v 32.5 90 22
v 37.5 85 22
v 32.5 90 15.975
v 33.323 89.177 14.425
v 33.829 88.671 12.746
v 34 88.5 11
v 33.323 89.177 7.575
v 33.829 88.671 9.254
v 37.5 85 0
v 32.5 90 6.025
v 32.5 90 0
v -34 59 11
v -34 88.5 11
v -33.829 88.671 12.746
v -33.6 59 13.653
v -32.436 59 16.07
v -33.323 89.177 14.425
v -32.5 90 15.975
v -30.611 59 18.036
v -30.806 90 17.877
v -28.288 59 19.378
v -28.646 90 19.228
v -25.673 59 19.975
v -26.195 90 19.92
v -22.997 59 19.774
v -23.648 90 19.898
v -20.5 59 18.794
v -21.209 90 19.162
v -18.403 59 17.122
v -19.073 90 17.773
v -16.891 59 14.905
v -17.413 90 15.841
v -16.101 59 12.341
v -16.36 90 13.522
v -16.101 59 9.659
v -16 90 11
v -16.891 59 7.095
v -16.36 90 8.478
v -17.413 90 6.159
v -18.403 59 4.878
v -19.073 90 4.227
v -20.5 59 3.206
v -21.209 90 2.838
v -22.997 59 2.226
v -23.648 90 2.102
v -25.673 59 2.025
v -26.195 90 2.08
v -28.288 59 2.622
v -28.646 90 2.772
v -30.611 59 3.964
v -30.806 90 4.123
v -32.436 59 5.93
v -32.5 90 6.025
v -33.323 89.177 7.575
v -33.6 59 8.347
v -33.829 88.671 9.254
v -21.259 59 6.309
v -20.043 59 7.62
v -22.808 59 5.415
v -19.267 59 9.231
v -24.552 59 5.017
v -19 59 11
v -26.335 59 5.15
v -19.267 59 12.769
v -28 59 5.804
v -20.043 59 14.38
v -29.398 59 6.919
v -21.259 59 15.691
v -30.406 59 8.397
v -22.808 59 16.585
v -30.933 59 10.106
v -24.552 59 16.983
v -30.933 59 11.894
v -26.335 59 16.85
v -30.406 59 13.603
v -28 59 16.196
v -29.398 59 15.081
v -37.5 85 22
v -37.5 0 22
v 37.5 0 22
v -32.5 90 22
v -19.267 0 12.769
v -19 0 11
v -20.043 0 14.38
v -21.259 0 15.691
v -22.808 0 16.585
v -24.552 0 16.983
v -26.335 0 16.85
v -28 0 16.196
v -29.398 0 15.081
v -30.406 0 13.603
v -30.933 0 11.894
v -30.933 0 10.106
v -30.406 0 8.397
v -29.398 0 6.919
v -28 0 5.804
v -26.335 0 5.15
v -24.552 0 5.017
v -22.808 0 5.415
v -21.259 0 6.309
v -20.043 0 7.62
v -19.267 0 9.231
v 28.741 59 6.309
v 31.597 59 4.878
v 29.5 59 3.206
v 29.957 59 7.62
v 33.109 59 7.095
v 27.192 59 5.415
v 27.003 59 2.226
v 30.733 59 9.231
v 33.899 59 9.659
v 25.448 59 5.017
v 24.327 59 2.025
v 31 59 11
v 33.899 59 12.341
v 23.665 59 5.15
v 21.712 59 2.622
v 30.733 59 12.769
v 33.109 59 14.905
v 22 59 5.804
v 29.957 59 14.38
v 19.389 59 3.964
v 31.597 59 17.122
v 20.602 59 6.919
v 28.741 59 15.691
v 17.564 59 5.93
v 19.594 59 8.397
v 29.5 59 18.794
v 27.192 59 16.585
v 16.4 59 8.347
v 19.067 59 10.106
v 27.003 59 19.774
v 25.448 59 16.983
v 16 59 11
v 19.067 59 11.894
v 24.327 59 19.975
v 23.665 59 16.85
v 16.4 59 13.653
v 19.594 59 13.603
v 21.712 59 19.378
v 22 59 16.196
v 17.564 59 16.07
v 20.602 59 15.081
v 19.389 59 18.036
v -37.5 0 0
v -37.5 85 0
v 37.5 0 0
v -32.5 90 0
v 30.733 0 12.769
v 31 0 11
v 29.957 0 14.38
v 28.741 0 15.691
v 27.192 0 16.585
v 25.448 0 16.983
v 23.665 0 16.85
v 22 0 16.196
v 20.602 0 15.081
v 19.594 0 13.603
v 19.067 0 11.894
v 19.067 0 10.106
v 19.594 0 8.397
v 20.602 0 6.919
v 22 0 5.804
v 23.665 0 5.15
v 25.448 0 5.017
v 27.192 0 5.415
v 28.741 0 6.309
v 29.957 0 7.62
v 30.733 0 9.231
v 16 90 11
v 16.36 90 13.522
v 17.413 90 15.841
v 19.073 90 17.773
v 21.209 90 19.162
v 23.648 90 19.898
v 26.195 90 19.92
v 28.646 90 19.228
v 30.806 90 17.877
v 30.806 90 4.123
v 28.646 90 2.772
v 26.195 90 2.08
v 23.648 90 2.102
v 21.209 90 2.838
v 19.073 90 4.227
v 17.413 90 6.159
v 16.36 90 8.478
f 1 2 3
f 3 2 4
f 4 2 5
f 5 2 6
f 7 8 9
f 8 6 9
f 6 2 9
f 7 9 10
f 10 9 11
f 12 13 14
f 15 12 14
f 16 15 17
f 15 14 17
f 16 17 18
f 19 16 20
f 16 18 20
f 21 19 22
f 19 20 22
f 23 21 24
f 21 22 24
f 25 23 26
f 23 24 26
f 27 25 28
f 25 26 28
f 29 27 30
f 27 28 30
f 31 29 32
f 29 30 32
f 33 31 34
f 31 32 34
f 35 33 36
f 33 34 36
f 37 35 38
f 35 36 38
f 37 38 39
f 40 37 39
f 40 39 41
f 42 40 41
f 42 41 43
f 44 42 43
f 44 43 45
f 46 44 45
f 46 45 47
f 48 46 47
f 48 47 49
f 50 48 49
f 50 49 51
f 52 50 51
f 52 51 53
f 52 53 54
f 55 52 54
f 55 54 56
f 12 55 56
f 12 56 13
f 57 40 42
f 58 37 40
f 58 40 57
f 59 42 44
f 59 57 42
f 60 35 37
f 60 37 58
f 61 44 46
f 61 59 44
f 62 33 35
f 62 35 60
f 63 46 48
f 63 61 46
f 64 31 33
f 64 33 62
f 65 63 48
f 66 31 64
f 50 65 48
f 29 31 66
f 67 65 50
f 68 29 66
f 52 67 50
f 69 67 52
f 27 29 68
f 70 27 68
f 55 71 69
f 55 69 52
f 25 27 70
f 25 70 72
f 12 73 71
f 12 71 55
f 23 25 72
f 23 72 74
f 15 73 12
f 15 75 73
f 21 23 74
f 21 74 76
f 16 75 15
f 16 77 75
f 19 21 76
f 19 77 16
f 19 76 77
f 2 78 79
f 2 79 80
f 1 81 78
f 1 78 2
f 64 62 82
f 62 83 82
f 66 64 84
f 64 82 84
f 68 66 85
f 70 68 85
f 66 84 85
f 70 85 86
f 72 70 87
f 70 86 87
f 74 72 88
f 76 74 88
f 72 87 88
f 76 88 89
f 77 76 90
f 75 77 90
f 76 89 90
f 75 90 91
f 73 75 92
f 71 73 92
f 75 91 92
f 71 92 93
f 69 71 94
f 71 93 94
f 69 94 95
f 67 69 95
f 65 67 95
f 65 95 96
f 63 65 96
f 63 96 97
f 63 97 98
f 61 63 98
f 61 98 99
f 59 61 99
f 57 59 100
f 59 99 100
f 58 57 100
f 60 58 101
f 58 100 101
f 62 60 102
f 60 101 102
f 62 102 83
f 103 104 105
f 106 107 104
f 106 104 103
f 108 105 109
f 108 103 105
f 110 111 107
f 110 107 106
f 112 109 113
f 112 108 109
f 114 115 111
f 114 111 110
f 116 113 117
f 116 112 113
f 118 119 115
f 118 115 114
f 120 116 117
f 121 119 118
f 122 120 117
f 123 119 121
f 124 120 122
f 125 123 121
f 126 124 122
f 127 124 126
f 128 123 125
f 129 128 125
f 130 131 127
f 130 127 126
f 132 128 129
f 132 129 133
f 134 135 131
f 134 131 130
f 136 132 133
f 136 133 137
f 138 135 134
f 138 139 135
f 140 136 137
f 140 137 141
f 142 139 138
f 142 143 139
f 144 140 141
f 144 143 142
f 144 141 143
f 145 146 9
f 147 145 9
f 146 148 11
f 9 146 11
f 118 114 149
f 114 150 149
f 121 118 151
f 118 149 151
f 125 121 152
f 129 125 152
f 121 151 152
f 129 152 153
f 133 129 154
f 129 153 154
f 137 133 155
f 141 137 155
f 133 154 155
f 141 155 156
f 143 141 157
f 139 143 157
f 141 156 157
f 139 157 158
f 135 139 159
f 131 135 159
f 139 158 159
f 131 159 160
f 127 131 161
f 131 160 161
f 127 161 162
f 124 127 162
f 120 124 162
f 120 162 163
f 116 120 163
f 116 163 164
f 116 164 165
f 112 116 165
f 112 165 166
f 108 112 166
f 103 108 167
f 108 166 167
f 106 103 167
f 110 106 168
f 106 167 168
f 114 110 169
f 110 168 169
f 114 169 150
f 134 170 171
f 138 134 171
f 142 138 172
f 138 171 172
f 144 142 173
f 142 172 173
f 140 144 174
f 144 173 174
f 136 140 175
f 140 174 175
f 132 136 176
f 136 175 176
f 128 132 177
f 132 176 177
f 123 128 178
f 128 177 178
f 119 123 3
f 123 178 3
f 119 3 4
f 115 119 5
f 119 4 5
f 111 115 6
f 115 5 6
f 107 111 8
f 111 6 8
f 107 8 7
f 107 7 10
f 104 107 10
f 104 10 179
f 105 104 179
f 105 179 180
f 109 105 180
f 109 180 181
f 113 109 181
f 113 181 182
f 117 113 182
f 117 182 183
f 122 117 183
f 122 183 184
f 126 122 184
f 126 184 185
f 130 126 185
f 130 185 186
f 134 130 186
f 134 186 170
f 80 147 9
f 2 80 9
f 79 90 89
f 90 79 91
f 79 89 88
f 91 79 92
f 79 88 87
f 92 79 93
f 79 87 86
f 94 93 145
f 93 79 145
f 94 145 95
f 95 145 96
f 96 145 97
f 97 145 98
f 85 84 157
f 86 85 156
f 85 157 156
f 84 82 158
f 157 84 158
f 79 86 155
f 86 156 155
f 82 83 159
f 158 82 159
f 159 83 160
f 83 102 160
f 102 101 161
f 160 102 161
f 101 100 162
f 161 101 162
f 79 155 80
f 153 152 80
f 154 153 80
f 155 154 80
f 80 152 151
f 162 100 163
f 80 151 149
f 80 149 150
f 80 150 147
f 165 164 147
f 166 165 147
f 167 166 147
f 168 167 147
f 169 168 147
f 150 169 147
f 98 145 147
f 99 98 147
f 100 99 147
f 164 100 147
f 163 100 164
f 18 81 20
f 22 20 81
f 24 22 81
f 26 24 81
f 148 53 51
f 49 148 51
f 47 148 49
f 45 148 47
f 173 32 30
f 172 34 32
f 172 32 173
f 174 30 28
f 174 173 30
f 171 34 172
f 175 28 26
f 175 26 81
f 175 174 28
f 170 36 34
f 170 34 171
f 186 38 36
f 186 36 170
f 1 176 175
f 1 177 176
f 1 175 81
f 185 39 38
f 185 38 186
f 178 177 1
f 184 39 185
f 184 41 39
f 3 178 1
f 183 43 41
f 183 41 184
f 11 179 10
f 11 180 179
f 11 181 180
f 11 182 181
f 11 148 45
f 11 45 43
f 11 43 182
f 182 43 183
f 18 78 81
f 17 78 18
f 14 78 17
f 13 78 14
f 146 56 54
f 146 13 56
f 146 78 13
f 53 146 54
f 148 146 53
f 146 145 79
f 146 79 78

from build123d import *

# Parameters (mm, degrees)
SKETCH1_W                                        = 75
SKETCH1_H                                        = 90
BOSS_EXTRUDE1_DEPTH                              = 22
CBORE_FOR_M10_SOCKET_HEAD_CAP_SCREW1_D           = 12
CBORE_FOR_M10_SOCKET_HEAD_CAP_SCREW1_CBORE_D     = 18
CBORE_FOR_M10_SOCKET_HEAD_CAP_SCREW1_CBORE_DEPTH = 31
CHAMFER1_SIZE                                    = 5


with BuildPart() as part:
    # Sketch1 → Boss-Extrude1 (new body)
    with BuildSketch(Plane.XY):
        with Locations((0, 45)):
            Rectangle(SKETCH1_W, SKETCH1_H)
    extrude(amount=BOSS_EXTRUDE1_DEPTH)

    # CBORE for M10 Socket Head Cap Screw1 (through all)
    with Locations(Plane(origin=(0, 90, 0), x_dir=(-1, 0, 0), z_dir=(0, 1, 0))):
        with Locations((25, 11), (-25, 11)):
            CounterBoreHole(CBORE_FOR_M10_SOCKET_HEAD_CAP_SCREW1_D / 2, CBORE_FOR_M10_SOCKET_HEAD_CAP_SCREW1_CBORE_D / 2, CBORE_FOR_M10_SOCKET_HEAD_CAP_SCREW1_CBORE_DEPTH)

    # Chamfer1
    # the kernel refuses this chamfer: 5 mm, written as the material it takes off along each edge
    with BuildSketch(Plane(origin=(-37.5, 90, -12.85841494), x_dir=(-0.027495876610586282, -0.9996219169112968, 0), z_dir=(0, 0, 1))) as chamfer1_piece_1:
        Polygon((CHAMFER1_SIZE * 0.999621916911, CHAMFER1_SIZE * 0.0274958766106), (-CHAMFER1_SIZE * 0.0274958766106, CHAMFER1_SIZE * 0.999621916911), (0, 0), align=None)
    extrude(amount=47.71682988, mode=Mode.SUBTRACT)
    with BuildSketch(Plane(origin=(37.5, 90, -12.85841494), x_dir=(0.027495876610586282, -0.9996219169112968, 0), z_dir=(0, 0, 1))) as chamfer1_piece_2:
        Polygon((CHAMFER1_SIZE * 0.999621916911, -CHAMFER1_SIZE * 0.0274958766106), (-CHAMFER1_SIZE * 0.0274958766106, -CHAMFER1_SIZE * 0.999621916911), (0, 0), align=None)
    extrude(amount=47.71682988, mode=Mode.SUBTRACT)


solid = part.part
